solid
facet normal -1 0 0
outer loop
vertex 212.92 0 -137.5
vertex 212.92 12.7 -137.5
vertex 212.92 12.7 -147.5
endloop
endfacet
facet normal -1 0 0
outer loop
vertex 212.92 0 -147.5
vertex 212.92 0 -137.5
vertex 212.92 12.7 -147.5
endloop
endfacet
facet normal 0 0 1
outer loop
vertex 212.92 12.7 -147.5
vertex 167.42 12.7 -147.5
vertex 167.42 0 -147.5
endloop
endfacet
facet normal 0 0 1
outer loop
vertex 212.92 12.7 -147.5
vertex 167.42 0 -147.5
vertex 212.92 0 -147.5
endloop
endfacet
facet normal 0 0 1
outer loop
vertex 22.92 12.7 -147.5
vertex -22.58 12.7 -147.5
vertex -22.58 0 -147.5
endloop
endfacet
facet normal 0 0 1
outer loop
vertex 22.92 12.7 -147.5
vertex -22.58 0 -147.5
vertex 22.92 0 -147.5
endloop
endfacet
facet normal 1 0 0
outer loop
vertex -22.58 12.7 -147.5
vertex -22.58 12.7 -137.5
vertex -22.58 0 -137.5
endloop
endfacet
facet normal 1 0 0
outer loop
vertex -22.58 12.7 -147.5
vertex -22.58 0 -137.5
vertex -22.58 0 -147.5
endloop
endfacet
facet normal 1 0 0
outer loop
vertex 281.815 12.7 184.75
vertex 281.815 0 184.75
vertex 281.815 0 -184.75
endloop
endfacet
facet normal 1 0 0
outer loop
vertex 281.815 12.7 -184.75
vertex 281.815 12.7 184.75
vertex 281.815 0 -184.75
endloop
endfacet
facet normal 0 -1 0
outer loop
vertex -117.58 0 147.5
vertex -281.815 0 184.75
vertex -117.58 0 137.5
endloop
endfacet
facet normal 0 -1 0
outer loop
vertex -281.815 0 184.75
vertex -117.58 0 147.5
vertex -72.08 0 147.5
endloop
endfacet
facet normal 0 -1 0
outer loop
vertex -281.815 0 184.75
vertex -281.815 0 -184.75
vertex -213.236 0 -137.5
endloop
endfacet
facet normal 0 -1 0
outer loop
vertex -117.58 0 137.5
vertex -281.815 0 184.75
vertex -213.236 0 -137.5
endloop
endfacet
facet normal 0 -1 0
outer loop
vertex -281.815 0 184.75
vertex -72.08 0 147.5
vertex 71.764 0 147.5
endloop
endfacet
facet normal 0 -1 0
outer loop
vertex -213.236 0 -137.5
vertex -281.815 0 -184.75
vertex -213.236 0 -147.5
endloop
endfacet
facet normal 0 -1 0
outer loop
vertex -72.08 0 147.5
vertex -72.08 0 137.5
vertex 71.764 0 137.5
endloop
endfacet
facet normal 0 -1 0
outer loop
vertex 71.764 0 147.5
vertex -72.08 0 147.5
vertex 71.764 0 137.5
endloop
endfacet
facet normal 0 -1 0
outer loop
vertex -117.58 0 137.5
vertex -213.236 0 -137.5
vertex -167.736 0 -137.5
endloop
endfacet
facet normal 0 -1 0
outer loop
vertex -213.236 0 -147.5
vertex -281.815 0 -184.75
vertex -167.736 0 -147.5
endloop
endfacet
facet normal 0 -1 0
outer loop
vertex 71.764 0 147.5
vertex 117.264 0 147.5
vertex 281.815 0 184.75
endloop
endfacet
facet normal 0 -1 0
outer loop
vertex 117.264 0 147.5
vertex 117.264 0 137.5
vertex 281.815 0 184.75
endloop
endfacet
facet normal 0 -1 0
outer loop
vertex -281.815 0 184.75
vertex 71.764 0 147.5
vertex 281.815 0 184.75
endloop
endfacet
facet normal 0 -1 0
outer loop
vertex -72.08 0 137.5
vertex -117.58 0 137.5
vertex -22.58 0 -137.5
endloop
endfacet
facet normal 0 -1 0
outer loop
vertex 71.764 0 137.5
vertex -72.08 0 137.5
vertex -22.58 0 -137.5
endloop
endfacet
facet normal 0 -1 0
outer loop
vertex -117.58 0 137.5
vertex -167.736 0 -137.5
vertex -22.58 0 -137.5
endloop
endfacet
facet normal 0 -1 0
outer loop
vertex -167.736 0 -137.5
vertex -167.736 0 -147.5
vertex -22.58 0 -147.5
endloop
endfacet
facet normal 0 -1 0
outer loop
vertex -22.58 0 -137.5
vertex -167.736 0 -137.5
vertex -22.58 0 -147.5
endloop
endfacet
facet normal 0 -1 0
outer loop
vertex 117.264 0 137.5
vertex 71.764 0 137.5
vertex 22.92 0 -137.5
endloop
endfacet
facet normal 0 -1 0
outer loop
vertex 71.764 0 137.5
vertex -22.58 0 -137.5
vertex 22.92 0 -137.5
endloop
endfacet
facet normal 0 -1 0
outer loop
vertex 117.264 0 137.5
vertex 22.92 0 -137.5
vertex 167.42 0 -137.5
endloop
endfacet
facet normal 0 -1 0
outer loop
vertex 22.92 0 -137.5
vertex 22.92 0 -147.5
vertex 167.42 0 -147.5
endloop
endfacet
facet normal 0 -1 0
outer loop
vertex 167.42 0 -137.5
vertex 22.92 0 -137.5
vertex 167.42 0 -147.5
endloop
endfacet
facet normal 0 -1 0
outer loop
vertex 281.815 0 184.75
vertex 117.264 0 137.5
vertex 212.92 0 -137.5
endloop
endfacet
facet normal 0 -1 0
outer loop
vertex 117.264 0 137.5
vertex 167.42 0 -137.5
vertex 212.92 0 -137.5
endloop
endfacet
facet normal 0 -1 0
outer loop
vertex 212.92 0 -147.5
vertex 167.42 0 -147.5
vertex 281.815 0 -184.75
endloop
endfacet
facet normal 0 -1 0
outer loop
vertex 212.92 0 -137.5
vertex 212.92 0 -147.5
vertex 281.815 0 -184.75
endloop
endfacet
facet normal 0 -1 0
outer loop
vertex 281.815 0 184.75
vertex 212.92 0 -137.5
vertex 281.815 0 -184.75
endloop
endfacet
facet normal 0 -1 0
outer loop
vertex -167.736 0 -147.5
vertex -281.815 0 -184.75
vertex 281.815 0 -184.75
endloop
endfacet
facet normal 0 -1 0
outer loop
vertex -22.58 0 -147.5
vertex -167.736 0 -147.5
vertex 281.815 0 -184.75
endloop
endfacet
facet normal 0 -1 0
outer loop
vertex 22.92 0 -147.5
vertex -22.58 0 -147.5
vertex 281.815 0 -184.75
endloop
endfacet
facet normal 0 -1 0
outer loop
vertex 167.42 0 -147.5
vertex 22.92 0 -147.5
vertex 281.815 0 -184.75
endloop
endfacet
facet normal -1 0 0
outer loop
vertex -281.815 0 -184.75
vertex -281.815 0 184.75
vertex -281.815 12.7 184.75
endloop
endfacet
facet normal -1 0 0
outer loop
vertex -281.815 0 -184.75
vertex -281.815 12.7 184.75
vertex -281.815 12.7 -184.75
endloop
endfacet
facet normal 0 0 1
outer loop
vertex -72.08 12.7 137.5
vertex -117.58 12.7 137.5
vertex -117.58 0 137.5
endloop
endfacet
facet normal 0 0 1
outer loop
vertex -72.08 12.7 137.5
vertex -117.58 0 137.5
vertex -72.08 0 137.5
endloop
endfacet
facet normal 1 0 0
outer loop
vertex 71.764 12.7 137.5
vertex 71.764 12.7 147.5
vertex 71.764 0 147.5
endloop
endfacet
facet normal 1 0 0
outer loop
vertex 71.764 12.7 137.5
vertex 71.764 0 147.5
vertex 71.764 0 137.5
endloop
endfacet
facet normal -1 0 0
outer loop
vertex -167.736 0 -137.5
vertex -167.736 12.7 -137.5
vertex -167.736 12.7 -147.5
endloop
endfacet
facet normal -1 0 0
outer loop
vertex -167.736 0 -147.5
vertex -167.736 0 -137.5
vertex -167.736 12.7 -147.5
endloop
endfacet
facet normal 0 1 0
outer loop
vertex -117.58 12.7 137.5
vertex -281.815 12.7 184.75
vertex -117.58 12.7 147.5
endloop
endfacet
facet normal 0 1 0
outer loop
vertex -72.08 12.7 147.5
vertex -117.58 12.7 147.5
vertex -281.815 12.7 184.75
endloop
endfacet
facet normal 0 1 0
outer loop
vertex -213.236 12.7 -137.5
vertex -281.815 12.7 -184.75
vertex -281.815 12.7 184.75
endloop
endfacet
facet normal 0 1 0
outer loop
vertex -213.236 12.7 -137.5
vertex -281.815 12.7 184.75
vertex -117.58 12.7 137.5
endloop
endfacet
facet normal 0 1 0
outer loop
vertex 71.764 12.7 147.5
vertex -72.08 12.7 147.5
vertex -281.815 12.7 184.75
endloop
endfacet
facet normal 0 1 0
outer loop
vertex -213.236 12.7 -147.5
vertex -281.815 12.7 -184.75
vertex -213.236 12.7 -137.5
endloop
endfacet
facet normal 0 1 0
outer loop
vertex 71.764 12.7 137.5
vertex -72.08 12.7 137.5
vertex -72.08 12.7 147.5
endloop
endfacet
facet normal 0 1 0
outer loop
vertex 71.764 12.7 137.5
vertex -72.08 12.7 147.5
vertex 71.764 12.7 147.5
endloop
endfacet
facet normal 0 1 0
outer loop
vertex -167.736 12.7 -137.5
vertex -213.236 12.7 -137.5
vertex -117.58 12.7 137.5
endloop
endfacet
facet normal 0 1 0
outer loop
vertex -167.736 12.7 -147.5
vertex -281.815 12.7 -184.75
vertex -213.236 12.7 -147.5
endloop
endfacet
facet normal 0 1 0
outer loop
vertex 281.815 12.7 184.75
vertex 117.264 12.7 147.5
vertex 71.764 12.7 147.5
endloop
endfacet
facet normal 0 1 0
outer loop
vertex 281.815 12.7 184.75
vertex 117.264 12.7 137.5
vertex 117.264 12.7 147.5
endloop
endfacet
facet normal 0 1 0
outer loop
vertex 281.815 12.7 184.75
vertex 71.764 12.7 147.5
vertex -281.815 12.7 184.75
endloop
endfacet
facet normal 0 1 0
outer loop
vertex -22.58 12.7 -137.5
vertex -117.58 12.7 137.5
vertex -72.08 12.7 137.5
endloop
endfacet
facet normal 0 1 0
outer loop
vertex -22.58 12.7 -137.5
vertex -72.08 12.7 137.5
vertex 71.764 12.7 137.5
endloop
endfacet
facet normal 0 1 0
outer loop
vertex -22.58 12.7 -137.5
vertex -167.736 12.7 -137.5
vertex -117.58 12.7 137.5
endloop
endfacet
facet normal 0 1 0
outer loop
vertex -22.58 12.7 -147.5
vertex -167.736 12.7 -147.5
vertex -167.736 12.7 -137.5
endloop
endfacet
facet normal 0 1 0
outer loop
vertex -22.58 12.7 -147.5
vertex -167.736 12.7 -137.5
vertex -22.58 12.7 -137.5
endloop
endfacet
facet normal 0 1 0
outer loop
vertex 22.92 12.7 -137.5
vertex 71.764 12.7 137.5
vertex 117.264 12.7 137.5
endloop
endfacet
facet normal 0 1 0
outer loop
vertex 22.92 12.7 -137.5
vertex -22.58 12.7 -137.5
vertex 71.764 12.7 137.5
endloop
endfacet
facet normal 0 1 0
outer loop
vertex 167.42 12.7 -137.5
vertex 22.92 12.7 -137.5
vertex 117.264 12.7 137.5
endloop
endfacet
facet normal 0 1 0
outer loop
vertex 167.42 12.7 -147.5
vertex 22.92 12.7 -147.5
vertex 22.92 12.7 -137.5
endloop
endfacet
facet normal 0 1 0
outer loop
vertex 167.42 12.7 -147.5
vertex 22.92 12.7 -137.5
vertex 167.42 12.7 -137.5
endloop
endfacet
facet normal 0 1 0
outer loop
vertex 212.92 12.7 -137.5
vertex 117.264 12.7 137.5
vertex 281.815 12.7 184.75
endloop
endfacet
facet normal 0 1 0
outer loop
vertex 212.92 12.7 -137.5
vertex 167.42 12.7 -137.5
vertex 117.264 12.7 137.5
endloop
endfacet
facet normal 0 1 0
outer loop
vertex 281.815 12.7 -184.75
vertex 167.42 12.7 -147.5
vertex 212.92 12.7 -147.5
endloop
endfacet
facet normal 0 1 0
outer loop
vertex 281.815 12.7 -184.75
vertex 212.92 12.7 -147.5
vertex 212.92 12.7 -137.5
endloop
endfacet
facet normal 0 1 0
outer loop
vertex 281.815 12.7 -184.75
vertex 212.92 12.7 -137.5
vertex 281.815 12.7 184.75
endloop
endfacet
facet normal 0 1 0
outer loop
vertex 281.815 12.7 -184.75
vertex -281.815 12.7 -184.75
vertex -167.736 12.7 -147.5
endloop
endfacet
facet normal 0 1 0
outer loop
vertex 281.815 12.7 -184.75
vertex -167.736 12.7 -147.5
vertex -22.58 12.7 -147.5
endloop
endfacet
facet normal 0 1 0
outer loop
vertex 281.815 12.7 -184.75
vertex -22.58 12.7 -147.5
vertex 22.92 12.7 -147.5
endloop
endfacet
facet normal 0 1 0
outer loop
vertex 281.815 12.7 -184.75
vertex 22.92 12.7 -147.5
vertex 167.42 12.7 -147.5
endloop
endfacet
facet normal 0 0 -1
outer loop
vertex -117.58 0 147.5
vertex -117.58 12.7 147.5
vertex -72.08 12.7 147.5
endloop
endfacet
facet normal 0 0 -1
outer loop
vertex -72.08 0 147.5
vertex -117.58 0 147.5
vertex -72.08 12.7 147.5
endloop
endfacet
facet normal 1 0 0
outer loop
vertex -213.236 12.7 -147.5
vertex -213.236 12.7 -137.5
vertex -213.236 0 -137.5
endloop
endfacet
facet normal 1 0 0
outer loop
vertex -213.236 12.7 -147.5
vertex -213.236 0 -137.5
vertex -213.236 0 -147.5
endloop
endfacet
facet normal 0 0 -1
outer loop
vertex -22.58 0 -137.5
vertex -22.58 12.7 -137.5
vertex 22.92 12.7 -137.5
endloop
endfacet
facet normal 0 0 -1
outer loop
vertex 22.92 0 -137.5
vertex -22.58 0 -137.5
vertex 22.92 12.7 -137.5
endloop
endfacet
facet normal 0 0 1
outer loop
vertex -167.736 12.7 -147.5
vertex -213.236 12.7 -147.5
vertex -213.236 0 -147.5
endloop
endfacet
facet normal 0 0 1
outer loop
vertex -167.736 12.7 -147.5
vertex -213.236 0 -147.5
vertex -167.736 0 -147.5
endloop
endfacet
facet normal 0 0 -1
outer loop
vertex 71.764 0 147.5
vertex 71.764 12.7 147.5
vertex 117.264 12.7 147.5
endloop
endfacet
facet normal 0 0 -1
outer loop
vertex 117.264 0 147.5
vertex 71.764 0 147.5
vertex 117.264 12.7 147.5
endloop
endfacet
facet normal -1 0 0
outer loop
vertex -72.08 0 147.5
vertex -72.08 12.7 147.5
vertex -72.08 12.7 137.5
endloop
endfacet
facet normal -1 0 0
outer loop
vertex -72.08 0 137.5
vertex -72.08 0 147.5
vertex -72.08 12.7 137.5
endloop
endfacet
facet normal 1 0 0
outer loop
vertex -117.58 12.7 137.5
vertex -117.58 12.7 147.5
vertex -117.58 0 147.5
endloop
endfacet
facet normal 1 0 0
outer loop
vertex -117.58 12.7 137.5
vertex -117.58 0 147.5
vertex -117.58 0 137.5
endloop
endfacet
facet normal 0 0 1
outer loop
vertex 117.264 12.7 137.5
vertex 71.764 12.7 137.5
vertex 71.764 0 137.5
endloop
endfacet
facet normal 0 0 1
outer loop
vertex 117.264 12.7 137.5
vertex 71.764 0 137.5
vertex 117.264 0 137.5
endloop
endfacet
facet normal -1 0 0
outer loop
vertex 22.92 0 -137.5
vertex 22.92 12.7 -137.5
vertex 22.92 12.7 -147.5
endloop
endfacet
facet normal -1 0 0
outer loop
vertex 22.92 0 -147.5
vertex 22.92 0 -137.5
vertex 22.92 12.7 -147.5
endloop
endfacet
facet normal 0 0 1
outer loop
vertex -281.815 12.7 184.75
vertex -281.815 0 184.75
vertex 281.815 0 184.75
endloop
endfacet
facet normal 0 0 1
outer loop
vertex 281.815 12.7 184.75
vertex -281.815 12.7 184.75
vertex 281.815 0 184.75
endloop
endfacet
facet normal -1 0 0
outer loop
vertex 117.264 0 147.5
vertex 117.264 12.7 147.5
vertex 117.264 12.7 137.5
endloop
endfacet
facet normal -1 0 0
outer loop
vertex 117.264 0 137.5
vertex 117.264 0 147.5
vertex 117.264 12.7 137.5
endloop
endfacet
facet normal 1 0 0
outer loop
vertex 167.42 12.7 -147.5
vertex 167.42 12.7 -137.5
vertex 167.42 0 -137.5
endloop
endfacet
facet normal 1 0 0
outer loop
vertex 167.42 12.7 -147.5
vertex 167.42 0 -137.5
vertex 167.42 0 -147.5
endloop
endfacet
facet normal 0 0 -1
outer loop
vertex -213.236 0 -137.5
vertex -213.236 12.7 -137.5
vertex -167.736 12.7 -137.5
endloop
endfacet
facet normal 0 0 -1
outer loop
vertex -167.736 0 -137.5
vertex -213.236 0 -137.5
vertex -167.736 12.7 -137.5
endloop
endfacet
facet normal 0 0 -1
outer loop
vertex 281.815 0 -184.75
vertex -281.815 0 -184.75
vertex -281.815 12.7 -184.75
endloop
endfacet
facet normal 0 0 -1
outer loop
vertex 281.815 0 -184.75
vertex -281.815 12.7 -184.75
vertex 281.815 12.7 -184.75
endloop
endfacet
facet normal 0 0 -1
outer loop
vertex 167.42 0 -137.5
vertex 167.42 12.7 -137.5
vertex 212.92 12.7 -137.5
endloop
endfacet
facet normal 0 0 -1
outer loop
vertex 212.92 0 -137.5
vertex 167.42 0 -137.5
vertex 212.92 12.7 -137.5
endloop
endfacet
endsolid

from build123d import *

# Parameters (mm, degrees)
SKETCH2_W               = 563.63
SKETCH2_H               = 369.5
BOSS_EXTRUDE1_DEPTH     = 12.7
SKETCH3_W               = 45.5
SKETCH3_H               = 10
CUT_EXTRUDE2_DEPTH      = 1
CUT_EXTRUDE2_DEPTH_BACK = 13.7


with BuildPart() as part:
    # Sketch2 → Boss-Extrude1 (new body)
    with BuildSketch(Plane(origin=(0, 0, 0), x_dir=(1, 0, 0), z_dir=(0, 1, 0))):
        Rectangle(SKETCH2_W, SKETCH2_H)
    extrude(amount=BOSS_EXTRUDE1_DEPTH)

    # Sketch3 → Cut-Extrude2 (cut, two sides)
    with BuildSketch(Plane(origin=(0, 12.7, 0), x_dir=(1, 0, 0), z_dir=(0, 1, 0))) as cut_extrude2_sk:
        with Locations((-190.485755703, 142.5)):
            Rectangle(SKETCH3_W, SKETCH3_H)
        with Locations((0.170132064, 142.5)):
            Rectangle(SKETCH3_W, SKETCH3_H)
        with Locations((190.170132064, 142.5)):
            Rectangle(SKETCH3_W, SKETCH3_H)
        with Locations((94.514244297, -142.5)):
            Rectangle(SKETCH3_W, SKETCH3_H)
        with Locations((-94.829867936, -142.5)):
            Rectangle(SKETCH3_W, SKETCH3_H)
    extrude(amount=CUT_EXTRUDE2_DEPTH, mode=Mode.SUBTRACT)
    extrude(cut_extrude2_sk.sketch, amount=-CUT_EXTRUDE2_DEPTH_BACK, mode=Mode.SUBTRACT)


solid = part.part
